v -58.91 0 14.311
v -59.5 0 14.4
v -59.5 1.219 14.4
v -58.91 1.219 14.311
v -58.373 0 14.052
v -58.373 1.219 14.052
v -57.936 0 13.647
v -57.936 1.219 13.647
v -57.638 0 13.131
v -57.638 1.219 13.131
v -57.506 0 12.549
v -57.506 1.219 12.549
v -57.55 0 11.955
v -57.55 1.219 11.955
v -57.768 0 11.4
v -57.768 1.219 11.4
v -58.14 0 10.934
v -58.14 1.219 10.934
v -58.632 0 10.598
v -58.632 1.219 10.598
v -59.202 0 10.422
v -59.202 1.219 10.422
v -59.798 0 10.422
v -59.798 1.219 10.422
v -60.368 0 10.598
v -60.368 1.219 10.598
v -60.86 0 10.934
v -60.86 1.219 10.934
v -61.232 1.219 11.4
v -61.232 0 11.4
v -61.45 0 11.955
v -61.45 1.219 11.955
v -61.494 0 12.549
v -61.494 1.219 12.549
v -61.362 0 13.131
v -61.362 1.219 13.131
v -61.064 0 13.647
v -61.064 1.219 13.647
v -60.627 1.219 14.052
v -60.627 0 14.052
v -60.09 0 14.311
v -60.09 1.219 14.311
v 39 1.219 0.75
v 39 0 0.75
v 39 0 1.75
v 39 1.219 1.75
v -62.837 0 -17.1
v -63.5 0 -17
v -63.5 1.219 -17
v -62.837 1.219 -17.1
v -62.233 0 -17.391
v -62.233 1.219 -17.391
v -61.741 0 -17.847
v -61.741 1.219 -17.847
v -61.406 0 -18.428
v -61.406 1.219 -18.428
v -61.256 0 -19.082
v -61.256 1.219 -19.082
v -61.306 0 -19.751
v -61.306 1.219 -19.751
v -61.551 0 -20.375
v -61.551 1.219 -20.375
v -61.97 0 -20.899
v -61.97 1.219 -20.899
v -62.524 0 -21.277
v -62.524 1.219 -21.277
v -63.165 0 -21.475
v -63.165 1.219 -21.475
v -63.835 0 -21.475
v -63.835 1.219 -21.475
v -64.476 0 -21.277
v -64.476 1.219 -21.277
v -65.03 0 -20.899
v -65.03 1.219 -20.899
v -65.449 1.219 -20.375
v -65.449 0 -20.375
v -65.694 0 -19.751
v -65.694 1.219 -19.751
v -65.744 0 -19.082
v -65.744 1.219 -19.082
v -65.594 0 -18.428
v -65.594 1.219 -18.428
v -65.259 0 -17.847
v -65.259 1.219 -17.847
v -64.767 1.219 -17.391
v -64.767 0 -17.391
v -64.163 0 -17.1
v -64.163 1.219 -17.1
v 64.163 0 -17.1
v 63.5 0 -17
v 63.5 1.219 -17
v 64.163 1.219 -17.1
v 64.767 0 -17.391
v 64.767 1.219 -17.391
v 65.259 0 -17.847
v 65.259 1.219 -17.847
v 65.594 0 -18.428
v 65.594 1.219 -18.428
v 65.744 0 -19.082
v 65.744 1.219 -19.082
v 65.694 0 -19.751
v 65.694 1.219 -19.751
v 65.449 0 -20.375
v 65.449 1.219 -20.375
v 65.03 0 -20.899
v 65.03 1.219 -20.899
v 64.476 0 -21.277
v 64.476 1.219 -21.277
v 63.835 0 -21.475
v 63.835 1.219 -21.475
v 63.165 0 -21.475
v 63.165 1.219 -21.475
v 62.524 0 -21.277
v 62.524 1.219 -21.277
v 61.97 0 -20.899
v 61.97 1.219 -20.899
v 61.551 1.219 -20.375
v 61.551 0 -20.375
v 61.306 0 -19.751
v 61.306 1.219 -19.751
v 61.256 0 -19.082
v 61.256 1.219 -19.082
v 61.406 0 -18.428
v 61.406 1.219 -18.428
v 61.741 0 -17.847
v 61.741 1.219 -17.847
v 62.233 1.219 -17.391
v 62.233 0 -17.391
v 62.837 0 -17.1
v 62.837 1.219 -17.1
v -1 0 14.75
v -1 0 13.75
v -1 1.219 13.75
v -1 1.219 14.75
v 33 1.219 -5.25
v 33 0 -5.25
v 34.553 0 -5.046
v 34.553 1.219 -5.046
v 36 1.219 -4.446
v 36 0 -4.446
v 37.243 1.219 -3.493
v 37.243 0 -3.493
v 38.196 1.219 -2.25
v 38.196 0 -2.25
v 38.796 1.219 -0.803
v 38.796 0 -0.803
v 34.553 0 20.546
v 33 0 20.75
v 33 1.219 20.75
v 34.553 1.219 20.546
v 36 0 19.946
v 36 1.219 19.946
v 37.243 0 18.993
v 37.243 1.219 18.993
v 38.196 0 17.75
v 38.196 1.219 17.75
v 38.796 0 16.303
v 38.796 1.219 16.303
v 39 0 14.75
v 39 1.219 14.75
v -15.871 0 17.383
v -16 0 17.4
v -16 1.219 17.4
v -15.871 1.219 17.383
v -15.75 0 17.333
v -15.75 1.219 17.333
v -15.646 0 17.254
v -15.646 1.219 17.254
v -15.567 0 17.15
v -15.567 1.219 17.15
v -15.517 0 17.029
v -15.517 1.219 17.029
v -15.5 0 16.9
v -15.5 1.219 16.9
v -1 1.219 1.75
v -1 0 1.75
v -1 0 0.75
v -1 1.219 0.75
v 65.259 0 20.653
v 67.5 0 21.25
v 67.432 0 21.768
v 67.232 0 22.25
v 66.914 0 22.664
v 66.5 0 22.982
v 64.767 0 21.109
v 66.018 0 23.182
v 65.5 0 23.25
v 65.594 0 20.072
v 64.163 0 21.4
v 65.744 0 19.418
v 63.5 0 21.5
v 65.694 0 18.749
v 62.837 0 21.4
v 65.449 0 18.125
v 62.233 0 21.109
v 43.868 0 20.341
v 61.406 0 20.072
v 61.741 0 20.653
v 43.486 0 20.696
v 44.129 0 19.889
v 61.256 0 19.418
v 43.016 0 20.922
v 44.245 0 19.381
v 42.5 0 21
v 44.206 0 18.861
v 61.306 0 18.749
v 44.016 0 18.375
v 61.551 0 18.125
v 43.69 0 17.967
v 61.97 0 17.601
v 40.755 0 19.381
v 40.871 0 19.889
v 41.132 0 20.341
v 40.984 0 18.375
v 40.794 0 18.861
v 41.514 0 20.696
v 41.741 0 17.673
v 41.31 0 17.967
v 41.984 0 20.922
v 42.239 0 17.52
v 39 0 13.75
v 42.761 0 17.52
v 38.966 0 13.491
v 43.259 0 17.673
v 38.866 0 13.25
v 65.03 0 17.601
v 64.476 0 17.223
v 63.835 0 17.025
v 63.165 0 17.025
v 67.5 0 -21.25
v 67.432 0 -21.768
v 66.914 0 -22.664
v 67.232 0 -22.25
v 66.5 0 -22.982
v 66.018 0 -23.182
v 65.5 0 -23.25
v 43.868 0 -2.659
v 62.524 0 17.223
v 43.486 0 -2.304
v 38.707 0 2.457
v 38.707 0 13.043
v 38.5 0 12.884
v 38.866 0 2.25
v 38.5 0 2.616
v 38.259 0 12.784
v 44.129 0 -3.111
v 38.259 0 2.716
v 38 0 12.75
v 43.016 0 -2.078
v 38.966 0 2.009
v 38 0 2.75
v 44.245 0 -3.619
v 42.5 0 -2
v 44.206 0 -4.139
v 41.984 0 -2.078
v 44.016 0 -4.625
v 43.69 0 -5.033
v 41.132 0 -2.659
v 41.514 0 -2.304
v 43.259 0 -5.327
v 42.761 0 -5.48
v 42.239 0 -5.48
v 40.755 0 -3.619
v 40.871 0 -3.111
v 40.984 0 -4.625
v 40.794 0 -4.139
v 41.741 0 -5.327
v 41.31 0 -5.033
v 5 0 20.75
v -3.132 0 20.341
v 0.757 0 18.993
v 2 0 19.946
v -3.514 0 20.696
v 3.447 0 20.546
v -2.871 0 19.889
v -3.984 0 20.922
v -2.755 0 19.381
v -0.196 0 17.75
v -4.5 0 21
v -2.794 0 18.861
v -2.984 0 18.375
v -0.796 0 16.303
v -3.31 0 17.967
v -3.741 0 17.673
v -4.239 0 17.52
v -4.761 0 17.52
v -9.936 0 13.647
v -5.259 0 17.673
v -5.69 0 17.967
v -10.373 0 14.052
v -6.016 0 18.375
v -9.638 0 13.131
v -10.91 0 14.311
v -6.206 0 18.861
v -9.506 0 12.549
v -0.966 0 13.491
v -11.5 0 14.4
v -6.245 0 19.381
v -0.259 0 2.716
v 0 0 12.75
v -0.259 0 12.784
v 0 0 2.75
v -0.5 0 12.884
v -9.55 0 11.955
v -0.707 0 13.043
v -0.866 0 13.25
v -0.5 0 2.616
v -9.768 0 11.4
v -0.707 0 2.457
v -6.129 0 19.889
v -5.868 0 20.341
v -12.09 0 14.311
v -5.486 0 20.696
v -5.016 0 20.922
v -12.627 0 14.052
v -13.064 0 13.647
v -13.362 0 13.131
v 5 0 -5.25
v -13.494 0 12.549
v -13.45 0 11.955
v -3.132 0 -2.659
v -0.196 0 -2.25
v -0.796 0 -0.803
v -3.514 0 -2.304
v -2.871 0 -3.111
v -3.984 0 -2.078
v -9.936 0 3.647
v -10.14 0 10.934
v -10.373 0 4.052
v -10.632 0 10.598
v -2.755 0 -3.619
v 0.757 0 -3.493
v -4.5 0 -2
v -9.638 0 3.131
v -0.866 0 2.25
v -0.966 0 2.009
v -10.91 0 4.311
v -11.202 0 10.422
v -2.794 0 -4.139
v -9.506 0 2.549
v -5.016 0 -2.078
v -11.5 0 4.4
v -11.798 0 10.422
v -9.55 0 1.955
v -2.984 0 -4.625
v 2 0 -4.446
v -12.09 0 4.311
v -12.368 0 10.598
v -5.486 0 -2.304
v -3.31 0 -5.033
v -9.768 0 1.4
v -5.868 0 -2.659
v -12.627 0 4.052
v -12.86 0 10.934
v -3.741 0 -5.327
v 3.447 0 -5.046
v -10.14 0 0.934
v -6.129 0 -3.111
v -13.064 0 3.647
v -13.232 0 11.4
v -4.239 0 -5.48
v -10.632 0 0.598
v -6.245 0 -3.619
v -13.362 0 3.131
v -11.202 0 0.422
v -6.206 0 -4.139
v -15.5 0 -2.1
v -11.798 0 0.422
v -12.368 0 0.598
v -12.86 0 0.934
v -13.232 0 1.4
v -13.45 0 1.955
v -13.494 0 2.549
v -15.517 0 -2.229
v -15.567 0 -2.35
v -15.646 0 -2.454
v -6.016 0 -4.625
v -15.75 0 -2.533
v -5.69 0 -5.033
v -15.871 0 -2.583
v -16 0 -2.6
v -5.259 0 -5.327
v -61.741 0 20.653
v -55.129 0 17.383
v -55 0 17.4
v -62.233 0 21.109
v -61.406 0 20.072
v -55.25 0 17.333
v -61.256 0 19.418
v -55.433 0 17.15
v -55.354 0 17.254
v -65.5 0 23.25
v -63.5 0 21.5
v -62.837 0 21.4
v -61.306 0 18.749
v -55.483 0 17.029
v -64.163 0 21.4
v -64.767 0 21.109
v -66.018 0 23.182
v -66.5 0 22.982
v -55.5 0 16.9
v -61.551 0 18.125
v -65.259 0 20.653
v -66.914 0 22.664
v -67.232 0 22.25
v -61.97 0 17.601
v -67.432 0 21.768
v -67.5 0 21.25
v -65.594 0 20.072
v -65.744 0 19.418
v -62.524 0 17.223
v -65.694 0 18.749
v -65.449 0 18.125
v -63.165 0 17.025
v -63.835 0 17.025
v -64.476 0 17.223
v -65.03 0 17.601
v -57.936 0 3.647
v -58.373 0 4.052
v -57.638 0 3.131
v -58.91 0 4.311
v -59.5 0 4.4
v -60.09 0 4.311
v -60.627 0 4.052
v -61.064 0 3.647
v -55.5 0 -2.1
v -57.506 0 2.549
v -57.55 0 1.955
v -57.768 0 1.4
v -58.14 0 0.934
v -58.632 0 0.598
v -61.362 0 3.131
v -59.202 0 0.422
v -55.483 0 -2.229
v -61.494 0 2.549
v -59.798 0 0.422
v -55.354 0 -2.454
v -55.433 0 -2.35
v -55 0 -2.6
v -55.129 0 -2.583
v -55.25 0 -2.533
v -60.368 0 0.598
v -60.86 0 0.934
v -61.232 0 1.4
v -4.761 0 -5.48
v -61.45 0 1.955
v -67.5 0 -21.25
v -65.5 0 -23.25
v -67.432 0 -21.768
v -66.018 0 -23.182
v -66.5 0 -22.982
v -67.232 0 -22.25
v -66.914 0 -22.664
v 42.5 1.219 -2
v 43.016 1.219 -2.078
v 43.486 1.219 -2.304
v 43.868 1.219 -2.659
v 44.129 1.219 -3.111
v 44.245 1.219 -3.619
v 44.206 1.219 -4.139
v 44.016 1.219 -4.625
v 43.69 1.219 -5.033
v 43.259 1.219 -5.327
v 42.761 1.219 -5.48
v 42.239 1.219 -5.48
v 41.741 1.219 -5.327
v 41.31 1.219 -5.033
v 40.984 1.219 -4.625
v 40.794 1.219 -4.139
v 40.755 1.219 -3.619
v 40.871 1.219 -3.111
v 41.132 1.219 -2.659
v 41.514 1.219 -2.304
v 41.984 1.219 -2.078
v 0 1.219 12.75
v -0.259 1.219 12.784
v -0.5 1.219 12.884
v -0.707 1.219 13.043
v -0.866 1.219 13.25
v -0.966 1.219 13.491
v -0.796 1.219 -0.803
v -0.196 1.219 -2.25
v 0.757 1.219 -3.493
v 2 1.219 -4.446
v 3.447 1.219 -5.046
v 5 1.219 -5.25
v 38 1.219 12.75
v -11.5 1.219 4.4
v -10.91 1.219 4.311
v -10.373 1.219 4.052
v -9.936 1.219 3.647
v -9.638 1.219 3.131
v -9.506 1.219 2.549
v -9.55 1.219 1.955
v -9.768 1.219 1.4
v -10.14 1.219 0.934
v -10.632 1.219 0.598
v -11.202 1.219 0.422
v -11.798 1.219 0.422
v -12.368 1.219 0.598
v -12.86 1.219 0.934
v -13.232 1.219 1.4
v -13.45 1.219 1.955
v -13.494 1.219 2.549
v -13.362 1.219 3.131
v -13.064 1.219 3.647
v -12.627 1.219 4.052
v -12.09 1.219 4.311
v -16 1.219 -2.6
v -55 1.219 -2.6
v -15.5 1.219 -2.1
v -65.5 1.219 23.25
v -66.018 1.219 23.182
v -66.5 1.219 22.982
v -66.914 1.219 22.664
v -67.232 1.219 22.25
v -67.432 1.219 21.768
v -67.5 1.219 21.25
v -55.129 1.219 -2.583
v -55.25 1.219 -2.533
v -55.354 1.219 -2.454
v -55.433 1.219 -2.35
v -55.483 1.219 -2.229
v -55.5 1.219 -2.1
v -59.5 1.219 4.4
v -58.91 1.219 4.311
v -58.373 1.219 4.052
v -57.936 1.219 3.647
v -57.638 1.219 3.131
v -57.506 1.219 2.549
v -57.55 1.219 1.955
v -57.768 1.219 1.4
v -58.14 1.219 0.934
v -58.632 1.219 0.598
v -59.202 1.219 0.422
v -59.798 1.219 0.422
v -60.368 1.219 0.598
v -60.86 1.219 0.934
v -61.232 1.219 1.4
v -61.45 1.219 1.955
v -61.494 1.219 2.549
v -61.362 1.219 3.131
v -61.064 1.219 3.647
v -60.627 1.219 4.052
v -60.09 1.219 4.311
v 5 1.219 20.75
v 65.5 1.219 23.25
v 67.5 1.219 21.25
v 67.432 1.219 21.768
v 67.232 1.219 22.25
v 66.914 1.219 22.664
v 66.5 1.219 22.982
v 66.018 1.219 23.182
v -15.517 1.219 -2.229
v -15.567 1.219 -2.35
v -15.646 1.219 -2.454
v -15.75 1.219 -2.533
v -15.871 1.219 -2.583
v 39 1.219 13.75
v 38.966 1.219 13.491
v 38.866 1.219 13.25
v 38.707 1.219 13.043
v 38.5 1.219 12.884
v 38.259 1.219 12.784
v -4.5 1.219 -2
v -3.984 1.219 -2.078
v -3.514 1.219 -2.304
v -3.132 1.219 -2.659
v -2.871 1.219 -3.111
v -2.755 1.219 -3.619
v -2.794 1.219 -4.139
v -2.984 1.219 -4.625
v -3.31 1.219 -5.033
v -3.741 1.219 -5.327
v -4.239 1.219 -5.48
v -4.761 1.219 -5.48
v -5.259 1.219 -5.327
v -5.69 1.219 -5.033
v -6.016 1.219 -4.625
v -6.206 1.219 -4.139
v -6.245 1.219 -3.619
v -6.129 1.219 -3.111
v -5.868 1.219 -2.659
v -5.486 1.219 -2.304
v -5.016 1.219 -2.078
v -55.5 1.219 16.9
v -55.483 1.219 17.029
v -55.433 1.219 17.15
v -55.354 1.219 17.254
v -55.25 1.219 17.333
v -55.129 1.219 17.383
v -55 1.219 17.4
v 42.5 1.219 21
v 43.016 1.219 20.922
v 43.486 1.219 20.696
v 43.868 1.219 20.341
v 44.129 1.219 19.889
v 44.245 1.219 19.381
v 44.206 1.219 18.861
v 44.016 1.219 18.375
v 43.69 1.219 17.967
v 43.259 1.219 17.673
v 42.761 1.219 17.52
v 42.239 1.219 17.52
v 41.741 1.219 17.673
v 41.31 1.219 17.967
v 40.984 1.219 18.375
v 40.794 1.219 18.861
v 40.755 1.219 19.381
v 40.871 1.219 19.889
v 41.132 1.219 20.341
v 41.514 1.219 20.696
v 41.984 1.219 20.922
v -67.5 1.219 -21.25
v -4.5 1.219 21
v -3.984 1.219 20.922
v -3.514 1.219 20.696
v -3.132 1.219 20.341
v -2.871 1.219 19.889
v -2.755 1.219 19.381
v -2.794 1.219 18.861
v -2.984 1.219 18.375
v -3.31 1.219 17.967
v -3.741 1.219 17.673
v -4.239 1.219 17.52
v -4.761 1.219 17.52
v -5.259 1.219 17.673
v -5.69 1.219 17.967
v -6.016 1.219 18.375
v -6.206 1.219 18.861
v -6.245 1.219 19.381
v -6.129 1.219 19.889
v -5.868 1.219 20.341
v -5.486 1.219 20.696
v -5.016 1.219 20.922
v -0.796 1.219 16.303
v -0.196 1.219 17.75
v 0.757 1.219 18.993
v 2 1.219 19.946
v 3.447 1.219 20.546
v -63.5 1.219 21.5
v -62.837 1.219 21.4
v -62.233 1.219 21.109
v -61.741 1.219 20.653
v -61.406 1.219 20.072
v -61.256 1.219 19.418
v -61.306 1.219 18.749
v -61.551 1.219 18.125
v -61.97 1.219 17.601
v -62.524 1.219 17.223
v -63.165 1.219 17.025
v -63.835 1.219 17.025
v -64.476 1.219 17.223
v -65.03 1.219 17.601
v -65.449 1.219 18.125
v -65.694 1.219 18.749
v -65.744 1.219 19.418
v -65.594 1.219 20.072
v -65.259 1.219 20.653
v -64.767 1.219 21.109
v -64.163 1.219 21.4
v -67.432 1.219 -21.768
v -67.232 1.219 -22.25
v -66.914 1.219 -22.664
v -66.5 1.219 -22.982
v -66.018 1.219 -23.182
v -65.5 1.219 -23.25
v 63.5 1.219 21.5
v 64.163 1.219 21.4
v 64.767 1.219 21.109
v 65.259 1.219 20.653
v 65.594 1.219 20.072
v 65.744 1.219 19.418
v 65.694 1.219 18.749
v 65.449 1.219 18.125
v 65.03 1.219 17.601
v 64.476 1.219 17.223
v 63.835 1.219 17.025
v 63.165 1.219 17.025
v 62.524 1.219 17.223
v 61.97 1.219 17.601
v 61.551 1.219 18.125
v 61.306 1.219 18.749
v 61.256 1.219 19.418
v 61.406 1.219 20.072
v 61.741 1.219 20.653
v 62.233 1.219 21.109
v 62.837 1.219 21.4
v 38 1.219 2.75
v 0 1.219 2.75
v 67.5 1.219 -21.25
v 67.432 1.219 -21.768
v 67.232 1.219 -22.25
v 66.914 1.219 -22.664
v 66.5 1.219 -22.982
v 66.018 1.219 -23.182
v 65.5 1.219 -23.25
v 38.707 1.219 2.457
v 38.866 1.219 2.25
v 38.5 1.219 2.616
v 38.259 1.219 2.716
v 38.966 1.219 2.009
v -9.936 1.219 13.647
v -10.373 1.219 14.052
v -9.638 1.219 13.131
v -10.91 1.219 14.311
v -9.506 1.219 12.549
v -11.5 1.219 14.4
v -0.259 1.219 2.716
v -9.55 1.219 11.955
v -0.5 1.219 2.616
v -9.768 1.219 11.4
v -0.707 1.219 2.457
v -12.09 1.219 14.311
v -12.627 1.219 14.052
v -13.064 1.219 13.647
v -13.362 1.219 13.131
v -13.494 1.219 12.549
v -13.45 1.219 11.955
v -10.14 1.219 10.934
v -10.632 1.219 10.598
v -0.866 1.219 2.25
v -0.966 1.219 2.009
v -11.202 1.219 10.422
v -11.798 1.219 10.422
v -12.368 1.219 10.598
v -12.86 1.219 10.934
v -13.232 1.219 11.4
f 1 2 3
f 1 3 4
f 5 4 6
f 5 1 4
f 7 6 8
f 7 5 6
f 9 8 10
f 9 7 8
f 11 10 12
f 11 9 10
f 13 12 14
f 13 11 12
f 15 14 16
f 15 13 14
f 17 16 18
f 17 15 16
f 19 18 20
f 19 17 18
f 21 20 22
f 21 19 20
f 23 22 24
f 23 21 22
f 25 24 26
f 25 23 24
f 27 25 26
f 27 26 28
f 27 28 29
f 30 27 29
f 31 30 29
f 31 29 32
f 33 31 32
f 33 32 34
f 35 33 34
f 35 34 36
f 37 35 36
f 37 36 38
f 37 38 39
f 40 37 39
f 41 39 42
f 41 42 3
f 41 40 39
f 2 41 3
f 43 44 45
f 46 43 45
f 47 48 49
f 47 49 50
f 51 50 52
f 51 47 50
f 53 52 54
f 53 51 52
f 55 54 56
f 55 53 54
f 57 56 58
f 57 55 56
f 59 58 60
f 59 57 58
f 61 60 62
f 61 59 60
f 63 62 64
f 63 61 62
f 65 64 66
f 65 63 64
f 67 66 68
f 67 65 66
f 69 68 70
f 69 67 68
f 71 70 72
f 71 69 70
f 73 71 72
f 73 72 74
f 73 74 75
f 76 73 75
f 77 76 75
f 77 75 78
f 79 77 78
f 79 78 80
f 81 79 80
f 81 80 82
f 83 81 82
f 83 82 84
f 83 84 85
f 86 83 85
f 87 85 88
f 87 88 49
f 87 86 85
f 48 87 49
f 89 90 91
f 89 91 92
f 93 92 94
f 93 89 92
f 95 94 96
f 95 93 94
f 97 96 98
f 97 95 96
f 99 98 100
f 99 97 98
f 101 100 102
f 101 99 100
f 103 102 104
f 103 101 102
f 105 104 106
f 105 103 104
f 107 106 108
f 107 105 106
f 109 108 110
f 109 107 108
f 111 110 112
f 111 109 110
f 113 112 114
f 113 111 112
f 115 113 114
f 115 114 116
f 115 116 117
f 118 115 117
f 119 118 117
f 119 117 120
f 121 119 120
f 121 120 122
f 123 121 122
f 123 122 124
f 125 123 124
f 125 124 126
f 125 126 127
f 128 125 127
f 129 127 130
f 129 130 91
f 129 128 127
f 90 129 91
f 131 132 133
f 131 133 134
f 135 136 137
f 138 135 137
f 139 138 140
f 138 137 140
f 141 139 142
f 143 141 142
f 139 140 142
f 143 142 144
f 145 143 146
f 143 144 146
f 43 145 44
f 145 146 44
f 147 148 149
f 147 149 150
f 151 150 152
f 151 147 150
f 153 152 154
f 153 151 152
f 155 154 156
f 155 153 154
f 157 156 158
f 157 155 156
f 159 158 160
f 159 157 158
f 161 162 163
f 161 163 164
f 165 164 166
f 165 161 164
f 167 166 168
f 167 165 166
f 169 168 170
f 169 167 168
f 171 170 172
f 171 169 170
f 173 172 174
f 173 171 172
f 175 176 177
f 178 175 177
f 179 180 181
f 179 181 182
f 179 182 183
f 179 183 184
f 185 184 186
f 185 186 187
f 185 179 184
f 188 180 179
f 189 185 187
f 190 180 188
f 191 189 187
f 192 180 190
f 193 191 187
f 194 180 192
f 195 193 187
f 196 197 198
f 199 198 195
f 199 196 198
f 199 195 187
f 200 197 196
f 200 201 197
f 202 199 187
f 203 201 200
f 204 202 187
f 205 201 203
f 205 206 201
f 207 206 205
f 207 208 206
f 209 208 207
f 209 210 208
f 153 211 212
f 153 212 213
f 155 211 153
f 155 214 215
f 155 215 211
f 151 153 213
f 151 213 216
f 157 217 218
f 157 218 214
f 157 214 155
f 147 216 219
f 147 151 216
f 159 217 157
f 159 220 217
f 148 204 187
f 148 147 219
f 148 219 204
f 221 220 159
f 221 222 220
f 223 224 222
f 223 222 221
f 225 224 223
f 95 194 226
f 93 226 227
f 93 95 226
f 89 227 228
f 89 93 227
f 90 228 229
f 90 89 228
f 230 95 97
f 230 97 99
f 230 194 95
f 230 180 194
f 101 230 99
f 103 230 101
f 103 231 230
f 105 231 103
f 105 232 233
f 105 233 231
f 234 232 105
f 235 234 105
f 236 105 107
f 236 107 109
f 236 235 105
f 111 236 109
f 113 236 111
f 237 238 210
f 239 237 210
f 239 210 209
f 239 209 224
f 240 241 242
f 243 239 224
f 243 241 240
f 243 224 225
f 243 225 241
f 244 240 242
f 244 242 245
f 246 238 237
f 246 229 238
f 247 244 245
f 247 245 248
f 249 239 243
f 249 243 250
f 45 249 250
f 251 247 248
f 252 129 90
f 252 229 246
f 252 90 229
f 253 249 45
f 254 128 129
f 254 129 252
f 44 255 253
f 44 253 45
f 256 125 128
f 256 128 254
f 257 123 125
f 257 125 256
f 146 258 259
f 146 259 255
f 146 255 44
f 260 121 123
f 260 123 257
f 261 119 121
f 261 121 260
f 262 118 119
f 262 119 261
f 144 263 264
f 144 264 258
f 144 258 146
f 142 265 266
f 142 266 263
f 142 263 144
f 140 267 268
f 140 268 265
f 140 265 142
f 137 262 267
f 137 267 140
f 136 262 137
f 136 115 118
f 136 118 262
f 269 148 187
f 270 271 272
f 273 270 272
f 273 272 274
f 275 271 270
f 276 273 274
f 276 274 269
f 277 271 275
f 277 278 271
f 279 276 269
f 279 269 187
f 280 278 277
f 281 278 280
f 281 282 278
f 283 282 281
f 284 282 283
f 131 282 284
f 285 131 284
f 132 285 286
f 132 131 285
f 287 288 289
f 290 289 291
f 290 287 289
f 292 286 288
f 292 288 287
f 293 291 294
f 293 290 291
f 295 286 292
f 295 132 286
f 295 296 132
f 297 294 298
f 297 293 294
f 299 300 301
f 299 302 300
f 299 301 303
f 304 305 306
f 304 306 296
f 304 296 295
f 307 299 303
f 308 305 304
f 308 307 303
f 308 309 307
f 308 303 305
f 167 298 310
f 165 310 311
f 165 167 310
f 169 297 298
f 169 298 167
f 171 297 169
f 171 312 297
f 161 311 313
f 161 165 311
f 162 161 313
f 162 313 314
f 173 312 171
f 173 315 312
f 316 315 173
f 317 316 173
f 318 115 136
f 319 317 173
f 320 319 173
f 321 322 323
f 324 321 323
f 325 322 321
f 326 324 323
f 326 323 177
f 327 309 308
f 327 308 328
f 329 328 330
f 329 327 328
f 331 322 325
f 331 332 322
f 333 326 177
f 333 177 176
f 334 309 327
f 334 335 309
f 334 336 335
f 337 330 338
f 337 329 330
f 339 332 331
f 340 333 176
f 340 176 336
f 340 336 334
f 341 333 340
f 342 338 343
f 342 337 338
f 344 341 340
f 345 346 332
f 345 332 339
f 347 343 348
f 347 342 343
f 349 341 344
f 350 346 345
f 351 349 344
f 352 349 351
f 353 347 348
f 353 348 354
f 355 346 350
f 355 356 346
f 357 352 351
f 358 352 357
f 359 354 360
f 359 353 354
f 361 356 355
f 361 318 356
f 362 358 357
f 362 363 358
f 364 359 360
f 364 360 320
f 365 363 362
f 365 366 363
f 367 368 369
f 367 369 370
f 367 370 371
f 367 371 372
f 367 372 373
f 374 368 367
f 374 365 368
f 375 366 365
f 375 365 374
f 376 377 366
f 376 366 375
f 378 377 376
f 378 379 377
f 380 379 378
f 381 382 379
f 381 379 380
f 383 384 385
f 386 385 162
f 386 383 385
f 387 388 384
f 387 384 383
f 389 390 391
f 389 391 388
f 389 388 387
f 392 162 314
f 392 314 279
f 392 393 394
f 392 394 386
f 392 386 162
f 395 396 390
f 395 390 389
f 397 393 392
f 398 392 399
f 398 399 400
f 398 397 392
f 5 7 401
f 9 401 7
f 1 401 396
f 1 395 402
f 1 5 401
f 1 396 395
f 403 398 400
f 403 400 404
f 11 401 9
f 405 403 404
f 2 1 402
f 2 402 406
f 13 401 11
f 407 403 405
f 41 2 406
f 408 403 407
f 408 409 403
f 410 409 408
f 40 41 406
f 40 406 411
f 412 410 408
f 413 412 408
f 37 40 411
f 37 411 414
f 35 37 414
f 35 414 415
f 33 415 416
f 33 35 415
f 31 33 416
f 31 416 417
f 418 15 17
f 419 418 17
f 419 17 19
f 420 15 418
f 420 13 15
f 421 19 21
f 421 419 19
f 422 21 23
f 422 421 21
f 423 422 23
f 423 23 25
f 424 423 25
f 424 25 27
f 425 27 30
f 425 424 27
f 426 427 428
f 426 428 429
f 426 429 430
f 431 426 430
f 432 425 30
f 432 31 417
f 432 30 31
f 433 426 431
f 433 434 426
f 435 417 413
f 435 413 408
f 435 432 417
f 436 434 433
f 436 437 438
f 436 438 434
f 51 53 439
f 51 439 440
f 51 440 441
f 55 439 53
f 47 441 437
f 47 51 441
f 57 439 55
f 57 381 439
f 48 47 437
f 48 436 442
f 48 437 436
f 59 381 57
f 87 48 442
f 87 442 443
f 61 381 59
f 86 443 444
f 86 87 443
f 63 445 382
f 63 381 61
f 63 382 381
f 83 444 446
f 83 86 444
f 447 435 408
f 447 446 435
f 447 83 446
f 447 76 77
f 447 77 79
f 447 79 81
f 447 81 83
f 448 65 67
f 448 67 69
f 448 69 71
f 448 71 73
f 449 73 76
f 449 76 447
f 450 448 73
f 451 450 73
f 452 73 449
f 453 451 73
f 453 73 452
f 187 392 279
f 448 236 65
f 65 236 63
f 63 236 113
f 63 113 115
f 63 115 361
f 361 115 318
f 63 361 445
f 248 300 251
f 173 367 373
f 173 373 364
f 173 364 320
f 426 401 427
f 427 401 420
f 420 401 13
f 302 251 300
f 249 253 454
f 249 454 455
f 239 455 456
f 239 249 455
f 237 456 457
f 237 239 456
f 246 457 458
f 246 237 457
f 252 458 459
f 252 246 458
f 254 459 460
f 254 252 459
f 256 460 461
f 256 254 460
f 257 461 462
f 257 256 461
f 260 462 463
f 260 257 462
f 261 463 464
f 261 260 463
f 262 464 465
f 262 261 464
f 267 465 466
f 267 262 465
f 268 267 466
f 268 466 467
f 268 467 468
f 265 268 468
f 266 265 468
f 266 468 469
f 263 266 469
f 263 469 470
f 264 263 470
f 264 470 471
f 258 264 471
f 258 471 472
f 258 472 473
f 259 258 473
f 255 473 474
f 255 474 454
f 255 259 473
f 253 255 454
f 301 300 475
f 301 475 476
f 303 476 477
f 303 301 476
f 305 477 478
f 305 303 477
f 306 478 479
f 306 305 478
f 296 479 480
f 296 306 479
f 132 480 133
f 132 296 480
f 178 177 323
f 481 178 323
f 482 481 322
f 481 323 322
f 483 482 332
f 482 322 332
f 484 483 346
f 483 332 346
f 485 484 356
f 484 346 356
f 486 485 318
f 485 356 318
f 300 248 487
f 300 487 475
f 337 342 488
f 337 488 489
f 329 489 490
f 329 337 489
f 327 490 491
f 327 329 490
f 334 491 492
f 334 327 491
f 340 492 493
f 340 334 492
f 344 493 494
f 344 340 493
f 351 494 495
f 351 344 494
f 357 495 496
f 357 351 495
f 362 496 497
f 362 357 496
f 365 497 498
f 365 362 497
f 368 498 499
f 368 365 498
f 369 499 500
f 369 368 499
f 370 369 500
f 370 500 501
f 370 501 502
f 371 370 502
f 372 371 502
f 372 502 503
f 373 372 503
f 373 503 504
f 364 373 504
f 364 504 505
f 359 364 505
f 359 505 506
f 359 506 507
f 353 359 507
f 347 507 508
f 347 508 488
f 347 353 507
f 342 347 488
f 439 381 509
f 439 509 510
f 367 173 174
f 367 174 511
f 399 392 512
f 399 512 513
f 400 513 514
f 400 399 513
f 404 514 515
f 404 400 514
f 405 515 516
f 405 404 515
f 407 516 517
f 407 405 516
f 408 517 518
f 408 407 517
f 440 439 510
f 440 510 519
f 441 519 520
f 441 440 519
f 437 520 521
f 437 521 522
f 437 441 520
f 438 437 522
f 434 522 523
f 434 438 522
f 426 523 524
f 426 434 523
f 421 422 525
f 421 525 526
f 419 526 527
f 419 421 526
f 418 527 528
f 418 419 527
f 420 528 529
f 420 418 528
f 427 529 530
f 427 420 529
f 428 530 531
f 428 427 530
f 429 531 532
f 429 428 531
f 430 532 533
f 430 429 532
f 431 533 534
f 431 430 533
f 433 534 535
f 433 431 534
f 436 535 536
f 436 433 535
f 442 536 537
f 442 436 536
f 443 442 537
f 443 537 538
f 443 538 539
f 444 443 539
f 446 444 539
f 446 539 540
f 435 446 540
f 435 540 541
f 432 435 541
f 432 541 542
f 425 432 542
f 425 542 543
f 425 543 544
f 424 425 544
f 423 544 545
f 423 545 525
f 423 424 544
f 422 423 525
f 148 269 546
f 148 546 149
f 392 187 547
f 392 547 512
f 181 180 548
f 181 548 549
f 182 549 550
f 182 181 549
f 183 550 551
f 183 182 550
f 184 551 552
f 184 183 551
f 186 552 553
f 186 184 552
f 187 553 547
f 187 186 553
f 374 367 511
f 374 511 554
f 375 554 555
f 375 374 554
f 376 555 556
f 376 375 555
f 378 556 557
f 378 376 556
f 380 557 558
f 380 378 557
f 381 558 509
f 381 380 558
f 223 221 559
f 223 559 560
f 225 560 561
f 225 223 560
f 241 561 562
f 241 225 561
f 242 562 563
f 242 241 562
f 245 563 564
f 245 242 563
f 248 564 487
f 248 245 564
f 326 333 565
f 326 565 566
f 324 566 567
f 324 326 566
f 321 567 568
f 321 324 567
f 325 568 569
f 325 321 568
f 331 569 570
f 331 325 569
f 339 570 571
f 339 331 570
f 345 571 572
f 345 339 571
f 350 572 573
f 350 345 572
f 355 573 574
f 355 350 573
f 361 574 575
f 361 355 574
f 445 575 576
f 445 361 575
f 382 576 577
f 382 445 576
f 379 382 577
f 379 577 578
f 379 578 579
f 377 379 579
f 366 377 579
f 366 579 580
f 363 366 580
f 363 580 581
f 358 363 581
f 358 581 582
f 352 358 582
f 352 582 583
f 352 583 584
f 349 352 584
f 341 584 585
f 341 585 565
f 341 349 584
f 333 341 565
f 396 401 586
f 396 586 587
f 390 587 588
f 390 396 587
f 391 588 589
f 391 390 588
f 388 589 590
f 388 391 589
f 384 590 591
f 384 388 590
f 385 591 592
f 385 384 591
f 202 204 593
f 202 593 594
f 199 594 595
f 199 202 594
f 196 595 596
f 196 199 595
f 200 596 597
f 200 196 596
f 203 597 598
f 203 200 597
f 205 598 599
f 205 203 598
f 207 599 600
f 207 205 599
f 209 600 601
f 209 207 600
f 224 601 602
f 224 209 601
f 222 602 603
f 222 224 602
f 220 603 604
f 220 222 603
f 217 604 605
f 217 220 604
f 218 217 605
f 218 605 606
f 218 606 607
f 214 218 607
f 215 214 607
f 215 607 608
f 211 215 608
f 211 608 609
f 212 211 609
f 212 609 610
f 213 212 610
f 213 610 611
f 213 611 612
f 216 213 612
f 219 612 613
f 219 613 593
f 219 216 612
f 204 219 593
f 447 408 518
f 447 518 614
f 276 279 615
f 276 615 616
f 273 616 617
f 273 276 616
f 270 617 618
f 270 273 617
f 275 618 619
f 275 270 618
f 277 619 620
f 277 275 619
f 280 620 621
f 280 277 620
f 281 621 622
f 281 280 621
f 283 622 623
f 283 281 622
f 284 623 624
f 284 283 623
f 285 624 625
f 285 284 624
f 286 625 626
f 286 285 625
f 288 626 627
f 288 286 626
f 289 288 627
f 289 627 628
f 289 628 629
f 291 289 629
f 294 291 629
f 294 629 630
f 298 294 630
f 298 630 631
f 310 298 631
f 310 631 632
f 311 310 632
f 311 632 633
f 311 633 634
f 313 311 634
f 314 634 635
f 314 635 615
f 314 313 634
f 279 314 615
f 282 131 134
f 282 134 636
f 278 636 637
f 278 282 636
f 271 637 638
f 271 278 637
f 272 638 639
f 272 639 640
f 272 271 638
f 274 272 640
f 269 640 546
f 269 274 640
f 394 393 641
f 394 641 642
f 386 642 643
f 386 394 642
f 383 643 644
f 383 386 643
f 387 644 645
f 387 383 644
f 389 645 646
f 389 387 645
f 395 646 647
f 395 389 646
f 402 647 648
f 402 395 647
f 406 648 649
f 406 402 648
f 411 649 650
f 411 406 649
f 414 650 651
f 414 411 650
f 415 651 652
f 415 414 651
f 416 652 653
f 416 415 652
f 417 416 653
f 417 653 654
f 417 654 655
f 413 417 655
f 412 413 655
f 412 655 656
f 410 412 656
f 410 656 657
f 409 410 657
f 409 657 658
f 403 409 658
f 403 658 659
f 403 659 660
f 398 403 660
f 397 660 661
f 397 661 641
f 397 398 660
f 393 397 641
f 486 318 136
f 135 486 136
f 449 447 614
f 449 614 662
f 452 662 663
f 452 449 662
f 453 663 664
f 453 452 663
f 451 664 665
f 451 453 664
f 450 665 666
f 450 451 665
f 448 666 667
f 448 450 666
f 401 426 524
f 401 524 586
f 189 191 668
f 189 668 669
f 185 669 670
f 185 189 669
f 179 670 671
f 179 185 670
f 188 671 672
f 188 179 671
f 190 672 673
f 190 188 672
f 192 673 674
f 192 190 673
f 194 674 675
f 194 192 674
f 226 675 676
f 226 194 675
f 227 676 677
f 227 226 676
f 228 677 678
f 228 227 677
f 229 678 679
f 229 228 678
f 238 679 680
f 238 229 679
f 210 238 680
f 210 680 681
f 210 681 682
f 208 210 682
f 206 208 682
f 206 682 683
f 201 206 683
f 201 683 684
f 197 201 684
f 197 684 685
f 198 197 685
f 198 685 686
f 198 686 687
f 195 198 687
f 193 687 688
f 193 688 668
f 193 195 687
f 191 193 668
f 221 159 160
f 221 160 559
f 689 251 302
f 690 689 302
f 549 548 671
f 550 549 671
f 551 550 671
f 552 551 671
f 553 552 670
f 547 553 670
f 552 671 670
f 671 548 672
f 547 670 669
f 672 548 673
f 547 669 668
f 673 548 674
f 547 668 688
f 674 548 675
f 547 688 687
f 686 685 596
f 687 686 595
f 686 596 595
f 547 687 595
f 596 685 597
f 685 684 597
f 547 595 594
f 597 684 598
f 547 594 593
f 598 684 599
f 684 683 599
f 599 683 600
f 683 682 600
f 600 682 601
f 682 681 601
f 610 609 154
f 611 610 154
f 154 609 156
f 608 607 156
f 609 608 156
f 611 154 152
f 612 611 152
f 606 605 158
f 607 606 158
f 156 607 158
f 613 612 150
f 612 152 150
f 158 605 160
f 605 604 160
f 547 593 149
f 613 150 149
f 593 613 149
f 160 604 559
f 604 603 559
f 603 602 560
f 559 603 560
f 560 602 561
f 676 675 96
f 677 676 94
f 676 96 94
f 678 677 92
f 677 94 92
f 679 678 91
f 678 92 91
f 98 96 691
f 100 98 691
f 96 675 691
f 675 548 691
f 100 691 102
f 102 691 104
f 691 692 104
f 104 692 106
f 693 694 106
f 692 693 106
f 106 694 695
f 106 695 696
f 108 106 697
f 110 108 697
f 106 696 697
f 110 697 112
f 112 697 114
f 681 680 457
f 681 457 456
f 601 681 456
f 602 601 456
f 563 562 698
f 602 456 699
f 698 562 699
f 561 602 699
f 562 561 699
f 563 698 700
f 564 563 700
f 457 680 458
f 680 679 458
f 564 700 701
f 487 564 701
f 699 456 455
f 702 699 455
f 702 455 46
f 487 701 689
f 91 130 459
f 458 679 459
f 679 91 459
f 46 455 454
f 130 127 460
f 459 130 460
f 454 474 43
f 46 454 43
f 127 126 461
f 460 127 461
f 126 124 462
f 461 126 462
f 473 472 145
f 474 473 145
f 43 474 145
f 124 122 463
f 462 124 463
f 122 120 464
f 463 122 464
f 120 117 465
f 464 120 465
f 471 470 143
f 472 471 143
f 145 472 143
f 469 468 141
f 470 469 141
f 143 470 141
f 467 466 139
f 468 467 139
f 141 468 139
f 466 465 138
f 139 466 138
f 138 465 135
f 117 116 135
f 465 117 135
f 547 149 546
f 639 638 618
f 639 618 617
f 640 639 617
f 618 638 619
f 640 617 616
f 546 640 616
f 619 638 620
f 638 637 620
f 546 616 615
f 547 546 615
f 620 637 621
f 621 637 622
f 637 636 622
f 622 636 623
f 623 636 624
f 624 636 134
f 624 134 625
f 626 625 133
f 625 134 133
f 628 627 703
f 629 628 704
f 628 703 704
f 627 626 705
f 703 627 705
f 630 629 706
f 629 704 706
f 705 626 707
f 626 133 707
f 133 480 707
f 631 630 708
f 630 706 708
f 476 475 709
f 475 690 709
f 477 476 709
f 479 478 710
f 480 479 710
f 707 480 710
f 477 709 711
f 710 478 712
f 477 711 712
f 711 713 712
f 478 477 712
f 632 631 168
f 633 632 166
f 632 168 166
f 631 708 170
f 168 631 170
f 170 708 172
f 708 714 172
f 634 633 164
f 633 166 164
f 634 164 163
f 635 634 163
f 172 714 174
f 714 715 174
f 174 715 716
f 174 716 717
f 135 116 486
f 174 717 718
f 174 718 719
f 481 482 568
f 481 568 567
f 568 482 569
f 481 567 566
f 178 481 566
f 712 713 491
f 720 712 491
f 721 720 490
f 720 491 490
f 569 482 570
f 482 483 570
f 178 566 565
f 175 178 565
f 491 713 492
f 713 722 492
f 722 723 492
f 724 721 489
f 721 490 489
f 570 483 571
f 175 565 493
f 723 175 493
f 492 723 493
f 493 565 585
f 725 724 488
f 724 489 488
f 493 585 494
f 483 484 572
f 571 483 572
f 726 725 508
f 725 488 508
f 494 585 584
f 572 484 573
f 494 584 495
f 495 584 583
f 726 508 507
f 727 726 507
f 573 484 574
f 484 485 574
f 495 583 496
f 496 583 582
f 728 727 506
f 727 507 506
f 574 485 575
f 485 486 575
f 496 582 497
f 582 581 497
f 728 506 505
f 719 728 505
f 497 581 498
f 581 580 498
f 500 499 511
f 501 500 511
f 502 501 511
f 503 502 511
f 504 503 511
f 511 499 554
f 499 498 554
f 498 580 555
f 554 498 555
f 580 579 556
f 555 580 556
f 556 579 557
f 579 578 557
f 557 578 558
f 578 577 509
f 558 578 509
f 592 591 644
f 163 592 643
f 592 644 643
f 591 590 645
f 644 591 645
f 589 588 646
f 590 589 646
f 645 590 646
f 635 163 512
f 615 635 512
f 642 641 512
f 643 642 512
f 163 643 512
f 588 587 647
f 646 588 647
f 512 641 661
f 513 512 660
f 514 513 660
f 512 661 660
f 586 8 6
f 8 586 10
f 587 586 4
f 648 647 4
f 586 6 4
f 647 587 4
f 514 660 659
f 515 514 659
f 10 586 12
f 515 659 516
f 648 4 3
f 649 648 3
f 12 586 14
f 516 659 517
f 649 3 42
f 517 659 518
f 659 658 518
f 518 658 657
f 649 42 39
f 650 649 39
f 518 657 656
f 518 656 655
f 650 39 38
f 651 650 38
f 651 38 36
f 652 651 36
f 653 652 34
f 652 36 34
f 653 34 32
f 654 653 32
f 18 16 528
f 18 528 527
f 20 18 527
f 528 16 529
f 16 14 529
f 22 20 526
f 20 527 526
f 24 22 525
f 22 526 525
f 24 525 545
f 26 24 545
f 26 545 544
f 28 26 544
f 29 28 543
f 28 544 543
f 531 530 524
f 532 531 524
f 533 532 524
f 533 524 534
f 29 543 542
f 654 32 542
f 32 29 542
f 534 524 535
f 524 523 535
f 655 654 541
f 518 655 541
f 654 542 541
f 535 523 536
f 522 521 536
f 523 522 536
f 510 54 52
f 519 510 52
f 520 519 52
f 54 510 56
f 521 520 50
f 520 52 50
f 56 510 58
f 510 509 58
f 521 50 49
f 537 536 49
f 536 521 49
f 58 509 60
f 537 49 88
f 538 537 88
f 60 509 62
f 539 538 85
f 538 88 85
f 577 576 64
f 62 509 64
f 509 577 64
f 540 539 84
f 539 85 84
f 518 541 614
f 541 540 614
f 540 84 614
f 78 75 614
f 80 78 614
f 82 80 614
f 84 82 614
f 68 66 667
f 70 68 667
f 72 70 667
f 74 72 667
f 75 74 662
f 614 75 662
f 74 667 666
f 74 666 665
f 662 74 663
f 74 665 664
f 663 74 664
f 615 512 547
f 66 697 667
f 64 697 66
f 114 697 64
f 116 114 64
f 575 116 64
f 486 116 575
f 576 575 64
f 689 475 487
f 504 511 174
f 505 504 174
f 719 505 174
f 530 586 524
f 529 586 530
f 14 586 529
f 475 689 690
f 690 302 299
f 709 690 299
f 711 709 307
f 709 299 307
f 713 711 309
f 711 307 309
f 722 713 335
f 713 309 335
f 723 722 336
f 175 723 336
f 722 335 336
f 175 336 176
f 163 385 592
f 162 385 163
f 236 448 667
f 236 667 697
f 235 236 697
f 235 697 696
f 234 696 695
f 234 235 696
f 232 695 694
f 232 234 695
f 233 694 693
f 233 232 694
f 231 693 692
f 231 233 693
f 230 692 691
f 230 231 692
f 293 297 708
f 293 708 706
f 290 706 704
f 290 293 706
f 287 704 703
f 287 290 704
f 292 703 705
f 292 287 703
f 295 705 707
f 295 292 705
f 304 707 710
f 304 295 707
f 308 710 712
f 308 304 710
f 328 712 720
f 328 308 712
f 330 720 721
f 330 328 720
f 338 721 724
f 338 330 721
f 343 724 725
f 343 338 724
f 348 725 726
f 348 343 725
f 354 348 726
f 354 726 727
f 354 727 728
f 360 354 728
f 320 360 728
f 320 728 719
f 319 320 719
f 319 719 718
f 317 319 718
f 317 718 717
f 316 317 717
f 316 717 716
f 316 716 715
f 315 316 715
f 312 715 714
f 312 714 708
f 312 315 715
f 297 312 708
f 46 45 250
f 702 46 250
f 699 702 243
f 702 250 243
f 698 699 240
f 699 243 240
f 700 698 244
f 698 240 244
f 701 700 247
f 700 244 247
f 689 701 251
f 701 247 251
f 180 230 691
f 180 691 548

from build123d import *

# Parameters (mm, degrees)
BASE_R      = 2.25
BASE_R_2    = 1.75
BASE_R_3    = 2
SHEET_DEPTH = 1.2192


with BuildPart() as part:
    # BASE → SHEET (new body)
    with BuildSketch(Plane(origin=(0, 0, 0), x_dir=(1, 0, 0), z_dir=(0, 1, 0))):
        with BuildLine():
            Line((65.5, -23.25), (-65.5, -23.25))
            ThreePointArc((-65.5, -23.25), (-66.914213562, -22.664213562), (-67.5, -21.25))
            Line((-67.5, -21.25), (-67.5, 21.25))
            ThreePointArc((-67.5, 21.25), (-66.914213562, 22.664213562), (-65.5, 23.25))
            Line((-65.5, 23.25), (65.5, 23.25))
            ThreePointArc((65.5, 23.25), (66.914213562, 22.664213562), (67.5, 21.25))
            Line((67.5, 21.25), (67.5, -21.25))
            ThreePointArc((67.5, -21.25), (66.914213562, -22.664213562), (65.5, -23.25))
        make_face()
        with Locations(Location((-63.5, 19.25, 0), (0, 0, 270))):
            Circle(BASE_R, mode=Mode.SUBTRACT)
        with Locations(Location((-63.5, -19.25, 0), (0, 0, 270))):
            Circle(BASE_R, mode=Mode.SUBTRACT)
        with Locations(Location((63.5, -19.25, 0), (0, 0, 270))):
            Circle(BASE_R, mode=Mode.SUBTRACT)
        with Locations(Location((63.5, 19.25, 0), (0, 0, 270))):
            Circle(BASE_R, mode=Mode.SUBTRACT)
        with Locations(Location((-4.5, 3.75, 0), (0, 0, 270))):
            Circle(BASE_R_2, mode=Mode.SUBTRACT)
        with Locations(Location((42.5, 3.75, 0), (0, 0, 270))):
            Circle(BASE_R_2, mode=Mode.SUBTRACT)
        with Locations(Location((42.5, -19.25, 0), (0, 0, 270))):
            Circle(BASE_R_2, mode=Mode.SUBTRACT)
        with Locations(Location((-4.5, -19.25, 0), (0, 0, 270))):
            Circle(BASE_R_2, mode=Mode.SUBTRACT)
        with Locations(Location((-59.5, -2.4, 0), (0, 0, 270))):
            Circle(BASE_R_3, mode=Mode.SUBTRACT)
        with Locations(Location((-59.5, -12.4, 0), (0, 0, 270))):
            Circle(BASE_R_3, mode=Mode.SUBTRACT)
        with Locations(Location((-11.5, -2.4, 0), (0, 0, 270))):
            Circle(BASE_R_3, mode=Mode.SUBTRACT)
        with Locations(Location((-11.5, -12.4, 0), (0, 0, 270))):
            Circle(BASE_R_3, mode=Mode.SUBTRACT)
        with BuildLine():
            Line((5, -20.75), (33, -20.75))
            ThreePointArc((33, -20.75), (37.242640687, -18.992640687), (39, -14.75))
            Line((39, -14.75), (39, -13.75))
            ThreePointArc((39, -13.75), (38.707106781, -13.042893219), (38, -12.75))
            Line((38, -12.75), (0, -12.75))
            ThreePointArc((0, -12.75), (-0.707106781, -13.042893219), (-1, -13.75))
            Line((-1, -13.75), (-1, -14.75))
            ThreePointArc((-1, -14.75), (0.757359313, -18.992640687), (5, -20.75))
        make_face(mode=Mode.SUBTRACT)
        with BuildLine():
            Line((5, 5.25), (33, 5.25))
            ThreePointArc((33, 5.25), (37.242640687, 3.492640687), (39, -0.75))
            Line((39, -0.75), (39, -1.75))
            ThreePointArc((39, -1.75), (38.707106781, -2.457106781), (38, -2.75))
            Line((38, -2.75), (0, -2.75))
            ThreePointArc((0, -2.75), (-0.707106781, -2.457106781), (-1, -1.75))
            Line((-1, -1.75), (-1, -0.75))
            ThreePointArc((-1, -0.75), (0.757359313, 3.492640687), (5, 5.25))
        make_face(mode=Mode.SUBTRACT)
        with BuildLine():
            Line((-55, -17.4), (-16, -17.4))
            ThreePointArc((-16, -17.4), (-15.646446609, -17.253553391), (-15.5, -16.9))
            Line((-15.5, -16.9), (-15.5, 2.1))
            ThreePointArc((-15.5, 2.1), (-15.646446609, 2.453553391), (-16, 2.6))
            Line((-16, 2.6), (-55, 2.6))
            ThreePointArc((-55, 2.6), (-55.353553391, 2.453553391), (-55.5, 2.1))
            Line((-55.5, 2.1), (-55.5, -16.9))
            ThreePointArc((-55.5, -16.9), (-55.353553391, -17.253553391), (-55, -17.4))
        make_face(mode=Mode.SUBTRACT)
    extrude(amount=SHEET_DEPTH)


solid = part.part
